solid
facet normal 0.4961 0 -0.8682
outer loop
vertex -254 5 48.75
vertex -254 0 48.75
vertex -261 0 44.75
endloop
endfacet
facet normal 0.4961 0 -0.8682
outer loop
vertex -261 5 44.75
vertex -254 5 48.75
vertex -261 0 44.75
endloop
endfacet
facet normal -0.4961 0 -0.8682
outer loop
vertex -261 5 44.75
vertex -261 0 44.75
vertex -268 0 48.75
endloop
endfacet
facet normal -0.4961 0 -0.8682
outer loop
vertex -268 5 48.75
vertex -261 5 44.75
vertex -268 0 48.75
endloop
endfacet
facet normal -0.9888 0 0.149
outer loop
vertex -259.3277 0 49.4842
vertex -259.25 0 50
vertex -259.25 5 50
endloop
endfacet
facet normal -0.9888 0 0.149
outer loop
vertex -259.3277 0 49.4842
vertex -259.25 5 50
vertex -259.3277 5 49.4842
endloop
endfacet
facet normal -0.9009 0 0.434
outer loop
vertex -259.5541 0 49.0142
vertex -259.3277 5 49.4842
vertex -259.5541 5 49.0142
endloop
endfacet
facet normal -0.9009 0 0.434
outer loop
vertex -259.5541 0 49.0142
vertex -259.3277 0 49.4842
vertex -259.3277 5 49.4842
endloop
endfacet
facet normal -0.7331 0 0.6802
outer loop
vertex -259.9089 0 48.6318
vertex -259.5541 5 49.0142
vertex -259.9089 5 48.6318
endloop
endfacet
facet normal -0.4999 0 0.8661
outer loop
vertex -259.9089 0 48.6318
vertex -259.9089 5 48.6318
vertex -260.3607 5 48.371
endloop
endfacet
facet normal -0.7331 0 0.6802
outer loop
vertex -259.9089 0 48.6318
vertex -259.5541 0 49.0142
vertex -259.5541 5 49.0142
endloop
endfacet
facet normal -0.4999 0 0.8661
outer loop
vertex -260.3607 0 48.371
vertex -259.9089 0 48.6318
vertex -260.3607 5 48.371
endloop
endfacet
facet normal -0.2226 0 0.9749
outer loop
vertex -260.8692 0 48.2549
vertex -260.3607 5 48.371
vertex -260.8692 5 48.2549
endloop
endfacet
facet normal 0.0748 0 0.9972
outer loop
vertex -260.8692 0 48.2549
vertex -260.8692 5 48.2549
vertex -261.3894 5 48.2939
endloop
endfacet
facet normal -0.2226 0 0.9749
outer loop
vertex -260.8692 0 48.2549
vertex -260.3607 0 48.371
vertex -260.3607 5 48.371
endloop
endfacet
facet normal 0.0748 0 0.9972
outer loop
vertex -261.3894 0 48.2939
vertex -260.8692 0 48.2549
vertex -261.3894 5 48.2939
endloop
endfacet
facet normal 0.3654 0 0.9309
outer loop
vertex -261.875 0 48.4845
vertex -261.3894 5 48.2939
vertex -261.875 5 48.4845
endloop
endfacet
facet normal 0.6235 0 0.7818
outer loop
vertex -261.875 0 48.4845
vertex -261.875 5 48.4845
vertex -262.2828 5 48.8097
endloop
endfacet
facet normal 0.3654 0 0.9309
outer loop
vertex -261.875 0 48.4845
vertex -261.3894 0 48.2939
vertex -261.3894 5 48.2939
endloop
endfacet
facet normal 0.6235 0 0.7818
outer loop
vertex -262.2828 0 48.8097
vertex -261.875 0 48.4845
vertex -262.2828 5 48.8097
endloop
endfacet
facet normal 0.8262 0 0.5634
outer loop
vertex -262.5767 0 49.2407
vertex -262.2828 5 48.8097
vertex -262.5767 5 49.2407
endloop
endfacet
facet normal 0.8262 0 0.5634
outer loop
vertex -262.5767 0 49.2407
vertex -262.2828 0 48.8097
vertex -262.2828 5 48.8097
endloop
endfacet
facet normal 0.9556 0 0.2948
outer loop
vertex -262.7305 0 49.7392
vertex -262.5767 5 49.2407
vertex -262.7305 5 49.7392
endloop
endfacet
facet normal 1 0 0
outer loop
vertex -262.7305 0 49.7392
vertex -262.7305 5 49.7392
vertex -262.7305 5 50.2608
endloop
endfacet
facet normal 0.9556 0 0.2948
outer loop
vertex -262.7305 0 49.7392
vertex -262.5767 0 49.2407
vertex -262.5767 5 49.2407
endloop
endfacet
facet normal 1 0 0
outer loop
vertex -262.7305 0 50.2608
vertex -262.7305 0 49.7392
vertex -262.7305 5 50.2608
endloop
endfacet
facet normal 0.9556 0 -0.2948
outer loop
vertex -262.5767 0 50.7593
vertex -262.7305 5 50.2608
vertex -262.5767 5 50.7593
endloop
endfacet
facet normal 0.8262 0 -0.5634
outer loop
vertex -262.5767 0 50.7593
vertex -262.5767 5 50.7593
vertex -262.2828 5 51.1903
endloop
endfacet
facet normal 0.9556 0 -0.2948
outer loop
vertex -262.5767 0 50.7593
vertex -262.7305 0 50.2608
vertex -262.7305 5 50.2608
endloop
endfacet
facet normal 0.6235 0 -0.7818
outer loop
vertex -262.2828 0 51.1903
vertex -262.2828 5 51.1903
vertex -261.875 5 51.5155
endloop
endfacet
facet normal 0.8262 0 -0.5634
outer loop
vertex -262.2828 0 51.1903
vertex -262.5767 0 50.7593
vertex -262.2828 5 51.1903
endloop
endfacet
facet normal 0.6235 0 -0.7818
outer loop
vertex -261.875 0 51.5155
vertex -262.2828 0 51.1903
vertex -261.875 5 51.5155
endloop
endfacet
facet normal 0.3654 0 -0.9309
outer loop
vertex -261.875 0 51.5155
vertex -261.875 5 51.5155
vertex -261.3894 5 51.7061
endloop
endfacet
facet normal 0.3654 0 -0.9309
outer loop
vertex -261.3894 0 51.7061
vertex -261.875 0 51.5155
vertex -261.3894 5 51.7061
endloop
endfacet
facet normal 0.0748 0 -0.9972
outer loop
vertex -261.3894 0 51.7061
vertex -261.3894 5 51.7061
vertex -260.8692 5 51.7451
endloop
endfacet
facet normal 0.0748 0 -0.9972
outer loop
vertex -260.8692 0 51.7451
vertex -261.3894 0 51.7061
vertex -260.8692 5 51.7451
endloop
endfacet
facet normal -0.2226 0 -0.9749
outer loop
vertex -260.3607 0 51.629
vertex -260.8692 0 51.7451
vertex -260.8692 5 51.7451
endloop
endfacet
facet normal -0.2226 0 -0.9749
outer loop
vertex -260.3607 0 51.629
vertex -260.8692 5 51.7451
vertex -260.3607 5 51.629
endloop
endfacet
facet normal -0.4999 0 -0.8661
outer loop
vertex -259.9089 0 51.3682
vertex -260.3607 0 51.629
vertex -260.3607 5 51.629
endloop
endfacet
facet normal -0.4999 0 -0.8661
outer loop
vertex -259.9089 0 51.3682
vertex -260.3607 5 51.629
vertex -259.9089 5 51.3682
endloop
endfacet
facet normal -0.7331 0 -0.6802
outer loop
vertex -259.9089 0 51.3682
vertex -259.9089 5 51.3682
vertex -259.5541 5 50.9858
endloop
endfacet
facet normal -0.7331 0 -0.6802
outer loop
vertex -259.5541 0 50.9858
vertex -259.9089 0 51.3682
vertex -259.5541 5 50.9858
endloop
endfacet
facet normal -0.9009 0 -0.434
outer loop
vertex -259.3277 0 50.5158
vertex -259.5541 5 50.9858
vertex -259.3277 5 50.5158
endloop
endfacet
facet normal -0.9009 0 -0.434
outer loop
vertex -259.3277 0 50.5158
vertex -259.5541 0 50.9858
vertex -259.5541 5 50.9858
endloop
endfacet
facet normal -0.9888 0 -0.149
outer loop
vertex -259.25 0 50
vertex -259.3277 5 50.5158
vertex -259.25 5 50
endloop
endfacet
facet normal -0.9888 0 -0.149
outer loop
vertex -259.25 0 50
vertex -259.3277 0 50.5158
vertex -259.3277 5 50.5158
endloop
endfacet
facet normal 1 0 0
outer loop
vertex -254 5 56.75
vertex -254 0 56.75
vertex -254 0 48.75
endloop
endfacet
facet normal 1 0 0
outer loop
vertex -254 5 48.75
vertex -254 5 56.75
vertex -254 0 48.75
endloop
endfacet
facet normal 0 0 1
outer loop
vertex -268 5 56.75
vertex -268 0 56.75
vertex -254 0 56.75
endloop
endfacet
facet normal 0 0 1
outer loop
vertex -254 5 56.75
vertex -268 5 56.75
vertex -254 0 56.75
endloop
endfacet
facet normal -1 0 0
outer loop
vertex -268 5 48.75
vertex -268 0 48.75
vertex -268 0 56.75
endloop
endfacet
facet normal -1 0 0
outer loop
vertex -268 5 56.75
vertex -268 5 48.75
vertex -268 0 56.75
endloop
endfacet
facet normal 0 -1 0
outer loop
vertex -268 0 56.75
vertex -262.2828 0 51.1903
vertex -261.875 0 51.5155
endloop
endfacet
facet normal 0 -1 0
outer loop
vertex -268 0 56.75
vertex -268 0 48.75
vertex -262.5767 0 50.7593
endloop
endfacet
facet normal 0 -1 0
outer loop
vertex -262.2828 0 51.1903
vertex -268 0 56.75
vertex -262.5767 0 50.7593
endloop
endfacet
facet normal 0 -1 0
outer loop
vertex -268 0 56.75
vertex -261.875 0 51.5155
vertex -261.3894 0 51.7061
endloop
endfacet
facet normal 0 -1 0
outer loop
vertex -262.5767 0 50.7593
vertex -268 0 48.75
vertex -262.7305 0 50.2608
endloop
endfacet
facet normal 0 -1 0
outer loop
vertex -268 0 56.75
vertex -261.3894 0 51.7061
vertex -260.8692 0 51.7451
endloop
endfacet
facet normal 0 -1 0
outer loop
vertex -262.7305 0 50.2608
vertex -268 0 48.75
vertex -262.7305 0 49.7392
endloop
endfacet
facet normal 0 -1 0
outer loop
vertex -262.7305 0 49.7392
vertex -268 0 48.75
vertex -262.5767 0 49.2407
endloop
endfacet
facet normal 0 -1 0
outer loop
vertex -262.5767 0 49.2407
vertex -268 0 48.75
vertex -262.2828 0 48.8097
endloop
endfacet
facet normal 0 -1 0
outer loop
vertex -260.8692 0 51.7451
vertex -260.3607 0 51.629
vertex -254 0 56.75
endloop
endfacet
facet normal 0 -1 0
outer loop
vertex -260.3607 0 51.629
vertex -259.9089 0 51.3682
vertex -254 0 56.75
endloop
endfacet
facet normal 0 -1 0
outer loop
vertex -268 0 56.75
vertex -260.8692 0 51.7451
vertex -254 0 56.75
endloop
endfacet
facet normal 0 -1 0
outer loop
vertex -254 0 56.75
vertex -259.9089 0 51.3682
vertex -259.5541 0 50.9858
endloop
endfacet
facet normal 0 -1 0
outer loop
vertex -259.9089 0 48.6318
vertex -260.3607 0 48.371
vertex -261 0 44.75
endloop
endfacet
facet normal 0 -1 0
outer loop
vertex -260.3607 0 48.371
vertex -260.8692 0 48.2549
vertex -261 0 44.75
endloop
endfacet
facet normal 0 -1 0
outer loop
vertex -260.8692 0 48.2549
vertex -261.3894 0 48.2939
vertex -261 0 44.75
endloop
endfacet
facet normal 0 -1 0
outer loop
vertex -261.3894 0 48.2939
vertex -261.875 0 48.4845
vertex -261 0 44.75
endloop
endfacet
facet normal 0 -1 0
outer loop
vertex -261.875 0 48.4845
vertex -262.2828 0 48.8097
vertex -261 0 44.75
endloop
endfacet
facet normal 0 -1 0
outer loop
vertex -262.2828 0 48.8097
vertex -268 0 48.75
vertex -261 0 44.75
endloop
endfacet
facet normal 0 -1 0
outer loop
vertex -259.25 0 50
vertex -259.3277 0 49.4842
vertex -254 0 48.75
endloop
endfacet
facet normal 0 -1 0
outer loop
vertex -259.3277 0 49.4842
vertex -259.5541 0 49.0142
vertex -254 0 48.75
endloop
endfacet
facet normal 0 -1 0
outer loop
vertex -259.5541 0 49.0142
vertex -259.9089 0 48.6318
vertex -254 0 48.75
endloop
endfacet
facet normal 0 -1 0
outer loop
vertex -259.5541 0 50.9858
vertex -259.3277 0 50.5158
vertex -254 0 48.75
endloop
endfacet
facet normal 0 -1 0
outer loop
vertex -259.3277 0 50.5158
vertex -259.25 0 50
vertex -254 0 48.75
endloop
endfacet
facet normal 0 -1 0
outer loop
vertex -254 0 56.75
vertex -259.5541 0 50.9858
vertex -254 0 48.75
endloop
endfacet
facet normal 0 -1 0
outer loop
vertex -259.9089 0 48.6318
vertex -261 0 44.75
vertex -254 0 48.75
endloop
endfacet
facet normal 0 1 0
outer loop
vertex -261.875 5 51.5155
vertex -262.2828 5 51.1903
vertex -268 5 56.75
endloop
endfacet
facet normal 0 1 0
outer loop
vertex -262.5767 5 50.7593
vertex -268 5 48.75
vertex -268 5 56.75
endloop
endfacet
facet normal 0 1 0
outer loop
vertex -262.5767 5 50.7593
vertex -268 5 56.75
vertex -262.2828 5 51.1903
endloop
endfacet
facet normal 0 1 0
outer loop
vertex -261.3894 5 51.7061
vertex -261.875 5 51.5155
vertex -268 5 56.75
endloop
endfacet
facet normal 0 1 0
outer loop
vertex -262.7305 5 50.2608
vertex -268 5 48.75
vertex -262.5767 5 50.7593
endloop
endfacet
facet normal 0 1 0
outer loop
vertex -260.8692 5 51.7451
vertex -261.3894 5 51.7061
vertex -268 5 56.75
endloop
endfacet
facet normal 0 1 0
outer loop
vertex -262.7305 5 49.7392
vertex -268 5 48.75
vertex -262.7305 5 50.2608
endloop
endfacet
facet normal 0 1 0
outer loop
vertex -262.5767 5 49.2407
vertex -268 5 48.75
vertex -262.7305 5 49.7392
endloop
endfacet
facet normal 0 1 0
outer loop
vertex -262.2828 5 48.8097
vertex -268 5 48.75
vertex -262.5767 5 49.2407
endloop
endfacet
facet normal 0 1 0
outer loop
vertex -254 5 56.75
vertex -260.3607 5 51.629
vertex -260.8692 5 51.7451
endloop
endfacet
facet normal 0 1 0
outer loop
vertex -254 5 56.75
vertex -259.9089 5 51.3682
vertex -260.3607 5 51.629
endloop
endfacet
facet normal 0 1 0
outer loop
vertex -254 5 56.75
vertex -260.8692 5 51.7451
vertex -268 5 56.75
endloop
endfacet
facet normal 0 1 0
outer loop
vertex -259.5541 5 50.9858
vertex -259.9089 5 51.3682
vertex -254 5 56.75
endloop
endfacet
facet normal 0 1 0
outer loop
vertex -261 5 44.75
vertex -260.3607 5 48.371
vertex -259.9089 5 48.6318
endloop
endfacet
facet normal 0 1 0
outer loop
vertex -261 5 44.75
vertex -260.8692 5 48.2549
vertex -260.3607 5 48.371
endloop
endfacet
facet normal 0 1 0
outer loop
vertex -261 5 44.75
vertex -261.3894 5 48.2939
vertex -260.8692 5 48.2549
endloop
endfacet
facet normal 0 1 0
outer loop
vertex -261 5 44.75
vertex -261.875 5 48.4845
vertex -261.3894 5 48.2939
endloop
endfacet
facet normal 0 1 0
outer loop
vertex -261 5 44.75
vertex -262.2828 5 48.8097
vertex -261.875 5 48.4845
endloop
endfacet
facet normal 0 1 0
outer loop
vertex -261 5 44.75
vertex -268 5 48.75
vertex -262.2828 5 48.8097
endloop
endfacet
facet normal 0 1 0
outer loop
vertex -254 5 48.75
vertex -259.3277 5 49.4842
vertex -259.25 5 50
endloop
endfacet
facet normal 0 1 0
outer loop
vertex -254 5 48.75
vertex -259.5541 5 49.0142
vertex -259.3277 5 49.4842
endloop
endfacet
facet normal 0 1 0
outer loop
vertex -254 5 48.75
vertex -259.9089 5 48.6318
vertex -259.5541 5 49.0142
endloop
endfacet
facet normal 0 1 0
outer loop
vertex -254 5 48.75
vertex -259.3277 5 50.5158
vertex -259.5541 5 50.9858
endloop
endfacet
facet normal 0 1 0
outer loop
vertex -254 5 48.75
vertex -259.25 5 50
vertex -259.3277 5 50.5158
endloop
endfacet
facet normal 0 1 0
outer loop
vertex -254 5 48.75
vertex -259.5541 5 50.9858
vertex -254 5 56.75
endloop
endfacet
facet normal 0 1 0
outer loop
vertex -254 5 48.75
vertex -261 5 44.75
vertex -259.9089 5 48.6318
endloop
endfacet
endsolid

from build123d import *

# Parameters (mm, degrees)
SKETCH2_R           = 1.75
BOSS_EXTRUDE3_DEPTH = 5


with BuildPart() as part:
    # Sketch2 → Boss-Extrude3 (new body)
    with BuildSketch(Plane(origin=(0, 0, 0), x_dir=(1, 0, 0), z_dir=(0, 1, 0))):
        Polygon((-268, -48.75), (-268, -56.75), (-254, -56.75), (-254, -48.75), (-261, -44.75), align=None)
        with Locations((-261, -50)):
            Circle(SKETCH2_R, mode=Mode.SUBTRACT)
    extrude(amount=BOSS_EXTRUDE3_DEPTH)


solid = part.part
